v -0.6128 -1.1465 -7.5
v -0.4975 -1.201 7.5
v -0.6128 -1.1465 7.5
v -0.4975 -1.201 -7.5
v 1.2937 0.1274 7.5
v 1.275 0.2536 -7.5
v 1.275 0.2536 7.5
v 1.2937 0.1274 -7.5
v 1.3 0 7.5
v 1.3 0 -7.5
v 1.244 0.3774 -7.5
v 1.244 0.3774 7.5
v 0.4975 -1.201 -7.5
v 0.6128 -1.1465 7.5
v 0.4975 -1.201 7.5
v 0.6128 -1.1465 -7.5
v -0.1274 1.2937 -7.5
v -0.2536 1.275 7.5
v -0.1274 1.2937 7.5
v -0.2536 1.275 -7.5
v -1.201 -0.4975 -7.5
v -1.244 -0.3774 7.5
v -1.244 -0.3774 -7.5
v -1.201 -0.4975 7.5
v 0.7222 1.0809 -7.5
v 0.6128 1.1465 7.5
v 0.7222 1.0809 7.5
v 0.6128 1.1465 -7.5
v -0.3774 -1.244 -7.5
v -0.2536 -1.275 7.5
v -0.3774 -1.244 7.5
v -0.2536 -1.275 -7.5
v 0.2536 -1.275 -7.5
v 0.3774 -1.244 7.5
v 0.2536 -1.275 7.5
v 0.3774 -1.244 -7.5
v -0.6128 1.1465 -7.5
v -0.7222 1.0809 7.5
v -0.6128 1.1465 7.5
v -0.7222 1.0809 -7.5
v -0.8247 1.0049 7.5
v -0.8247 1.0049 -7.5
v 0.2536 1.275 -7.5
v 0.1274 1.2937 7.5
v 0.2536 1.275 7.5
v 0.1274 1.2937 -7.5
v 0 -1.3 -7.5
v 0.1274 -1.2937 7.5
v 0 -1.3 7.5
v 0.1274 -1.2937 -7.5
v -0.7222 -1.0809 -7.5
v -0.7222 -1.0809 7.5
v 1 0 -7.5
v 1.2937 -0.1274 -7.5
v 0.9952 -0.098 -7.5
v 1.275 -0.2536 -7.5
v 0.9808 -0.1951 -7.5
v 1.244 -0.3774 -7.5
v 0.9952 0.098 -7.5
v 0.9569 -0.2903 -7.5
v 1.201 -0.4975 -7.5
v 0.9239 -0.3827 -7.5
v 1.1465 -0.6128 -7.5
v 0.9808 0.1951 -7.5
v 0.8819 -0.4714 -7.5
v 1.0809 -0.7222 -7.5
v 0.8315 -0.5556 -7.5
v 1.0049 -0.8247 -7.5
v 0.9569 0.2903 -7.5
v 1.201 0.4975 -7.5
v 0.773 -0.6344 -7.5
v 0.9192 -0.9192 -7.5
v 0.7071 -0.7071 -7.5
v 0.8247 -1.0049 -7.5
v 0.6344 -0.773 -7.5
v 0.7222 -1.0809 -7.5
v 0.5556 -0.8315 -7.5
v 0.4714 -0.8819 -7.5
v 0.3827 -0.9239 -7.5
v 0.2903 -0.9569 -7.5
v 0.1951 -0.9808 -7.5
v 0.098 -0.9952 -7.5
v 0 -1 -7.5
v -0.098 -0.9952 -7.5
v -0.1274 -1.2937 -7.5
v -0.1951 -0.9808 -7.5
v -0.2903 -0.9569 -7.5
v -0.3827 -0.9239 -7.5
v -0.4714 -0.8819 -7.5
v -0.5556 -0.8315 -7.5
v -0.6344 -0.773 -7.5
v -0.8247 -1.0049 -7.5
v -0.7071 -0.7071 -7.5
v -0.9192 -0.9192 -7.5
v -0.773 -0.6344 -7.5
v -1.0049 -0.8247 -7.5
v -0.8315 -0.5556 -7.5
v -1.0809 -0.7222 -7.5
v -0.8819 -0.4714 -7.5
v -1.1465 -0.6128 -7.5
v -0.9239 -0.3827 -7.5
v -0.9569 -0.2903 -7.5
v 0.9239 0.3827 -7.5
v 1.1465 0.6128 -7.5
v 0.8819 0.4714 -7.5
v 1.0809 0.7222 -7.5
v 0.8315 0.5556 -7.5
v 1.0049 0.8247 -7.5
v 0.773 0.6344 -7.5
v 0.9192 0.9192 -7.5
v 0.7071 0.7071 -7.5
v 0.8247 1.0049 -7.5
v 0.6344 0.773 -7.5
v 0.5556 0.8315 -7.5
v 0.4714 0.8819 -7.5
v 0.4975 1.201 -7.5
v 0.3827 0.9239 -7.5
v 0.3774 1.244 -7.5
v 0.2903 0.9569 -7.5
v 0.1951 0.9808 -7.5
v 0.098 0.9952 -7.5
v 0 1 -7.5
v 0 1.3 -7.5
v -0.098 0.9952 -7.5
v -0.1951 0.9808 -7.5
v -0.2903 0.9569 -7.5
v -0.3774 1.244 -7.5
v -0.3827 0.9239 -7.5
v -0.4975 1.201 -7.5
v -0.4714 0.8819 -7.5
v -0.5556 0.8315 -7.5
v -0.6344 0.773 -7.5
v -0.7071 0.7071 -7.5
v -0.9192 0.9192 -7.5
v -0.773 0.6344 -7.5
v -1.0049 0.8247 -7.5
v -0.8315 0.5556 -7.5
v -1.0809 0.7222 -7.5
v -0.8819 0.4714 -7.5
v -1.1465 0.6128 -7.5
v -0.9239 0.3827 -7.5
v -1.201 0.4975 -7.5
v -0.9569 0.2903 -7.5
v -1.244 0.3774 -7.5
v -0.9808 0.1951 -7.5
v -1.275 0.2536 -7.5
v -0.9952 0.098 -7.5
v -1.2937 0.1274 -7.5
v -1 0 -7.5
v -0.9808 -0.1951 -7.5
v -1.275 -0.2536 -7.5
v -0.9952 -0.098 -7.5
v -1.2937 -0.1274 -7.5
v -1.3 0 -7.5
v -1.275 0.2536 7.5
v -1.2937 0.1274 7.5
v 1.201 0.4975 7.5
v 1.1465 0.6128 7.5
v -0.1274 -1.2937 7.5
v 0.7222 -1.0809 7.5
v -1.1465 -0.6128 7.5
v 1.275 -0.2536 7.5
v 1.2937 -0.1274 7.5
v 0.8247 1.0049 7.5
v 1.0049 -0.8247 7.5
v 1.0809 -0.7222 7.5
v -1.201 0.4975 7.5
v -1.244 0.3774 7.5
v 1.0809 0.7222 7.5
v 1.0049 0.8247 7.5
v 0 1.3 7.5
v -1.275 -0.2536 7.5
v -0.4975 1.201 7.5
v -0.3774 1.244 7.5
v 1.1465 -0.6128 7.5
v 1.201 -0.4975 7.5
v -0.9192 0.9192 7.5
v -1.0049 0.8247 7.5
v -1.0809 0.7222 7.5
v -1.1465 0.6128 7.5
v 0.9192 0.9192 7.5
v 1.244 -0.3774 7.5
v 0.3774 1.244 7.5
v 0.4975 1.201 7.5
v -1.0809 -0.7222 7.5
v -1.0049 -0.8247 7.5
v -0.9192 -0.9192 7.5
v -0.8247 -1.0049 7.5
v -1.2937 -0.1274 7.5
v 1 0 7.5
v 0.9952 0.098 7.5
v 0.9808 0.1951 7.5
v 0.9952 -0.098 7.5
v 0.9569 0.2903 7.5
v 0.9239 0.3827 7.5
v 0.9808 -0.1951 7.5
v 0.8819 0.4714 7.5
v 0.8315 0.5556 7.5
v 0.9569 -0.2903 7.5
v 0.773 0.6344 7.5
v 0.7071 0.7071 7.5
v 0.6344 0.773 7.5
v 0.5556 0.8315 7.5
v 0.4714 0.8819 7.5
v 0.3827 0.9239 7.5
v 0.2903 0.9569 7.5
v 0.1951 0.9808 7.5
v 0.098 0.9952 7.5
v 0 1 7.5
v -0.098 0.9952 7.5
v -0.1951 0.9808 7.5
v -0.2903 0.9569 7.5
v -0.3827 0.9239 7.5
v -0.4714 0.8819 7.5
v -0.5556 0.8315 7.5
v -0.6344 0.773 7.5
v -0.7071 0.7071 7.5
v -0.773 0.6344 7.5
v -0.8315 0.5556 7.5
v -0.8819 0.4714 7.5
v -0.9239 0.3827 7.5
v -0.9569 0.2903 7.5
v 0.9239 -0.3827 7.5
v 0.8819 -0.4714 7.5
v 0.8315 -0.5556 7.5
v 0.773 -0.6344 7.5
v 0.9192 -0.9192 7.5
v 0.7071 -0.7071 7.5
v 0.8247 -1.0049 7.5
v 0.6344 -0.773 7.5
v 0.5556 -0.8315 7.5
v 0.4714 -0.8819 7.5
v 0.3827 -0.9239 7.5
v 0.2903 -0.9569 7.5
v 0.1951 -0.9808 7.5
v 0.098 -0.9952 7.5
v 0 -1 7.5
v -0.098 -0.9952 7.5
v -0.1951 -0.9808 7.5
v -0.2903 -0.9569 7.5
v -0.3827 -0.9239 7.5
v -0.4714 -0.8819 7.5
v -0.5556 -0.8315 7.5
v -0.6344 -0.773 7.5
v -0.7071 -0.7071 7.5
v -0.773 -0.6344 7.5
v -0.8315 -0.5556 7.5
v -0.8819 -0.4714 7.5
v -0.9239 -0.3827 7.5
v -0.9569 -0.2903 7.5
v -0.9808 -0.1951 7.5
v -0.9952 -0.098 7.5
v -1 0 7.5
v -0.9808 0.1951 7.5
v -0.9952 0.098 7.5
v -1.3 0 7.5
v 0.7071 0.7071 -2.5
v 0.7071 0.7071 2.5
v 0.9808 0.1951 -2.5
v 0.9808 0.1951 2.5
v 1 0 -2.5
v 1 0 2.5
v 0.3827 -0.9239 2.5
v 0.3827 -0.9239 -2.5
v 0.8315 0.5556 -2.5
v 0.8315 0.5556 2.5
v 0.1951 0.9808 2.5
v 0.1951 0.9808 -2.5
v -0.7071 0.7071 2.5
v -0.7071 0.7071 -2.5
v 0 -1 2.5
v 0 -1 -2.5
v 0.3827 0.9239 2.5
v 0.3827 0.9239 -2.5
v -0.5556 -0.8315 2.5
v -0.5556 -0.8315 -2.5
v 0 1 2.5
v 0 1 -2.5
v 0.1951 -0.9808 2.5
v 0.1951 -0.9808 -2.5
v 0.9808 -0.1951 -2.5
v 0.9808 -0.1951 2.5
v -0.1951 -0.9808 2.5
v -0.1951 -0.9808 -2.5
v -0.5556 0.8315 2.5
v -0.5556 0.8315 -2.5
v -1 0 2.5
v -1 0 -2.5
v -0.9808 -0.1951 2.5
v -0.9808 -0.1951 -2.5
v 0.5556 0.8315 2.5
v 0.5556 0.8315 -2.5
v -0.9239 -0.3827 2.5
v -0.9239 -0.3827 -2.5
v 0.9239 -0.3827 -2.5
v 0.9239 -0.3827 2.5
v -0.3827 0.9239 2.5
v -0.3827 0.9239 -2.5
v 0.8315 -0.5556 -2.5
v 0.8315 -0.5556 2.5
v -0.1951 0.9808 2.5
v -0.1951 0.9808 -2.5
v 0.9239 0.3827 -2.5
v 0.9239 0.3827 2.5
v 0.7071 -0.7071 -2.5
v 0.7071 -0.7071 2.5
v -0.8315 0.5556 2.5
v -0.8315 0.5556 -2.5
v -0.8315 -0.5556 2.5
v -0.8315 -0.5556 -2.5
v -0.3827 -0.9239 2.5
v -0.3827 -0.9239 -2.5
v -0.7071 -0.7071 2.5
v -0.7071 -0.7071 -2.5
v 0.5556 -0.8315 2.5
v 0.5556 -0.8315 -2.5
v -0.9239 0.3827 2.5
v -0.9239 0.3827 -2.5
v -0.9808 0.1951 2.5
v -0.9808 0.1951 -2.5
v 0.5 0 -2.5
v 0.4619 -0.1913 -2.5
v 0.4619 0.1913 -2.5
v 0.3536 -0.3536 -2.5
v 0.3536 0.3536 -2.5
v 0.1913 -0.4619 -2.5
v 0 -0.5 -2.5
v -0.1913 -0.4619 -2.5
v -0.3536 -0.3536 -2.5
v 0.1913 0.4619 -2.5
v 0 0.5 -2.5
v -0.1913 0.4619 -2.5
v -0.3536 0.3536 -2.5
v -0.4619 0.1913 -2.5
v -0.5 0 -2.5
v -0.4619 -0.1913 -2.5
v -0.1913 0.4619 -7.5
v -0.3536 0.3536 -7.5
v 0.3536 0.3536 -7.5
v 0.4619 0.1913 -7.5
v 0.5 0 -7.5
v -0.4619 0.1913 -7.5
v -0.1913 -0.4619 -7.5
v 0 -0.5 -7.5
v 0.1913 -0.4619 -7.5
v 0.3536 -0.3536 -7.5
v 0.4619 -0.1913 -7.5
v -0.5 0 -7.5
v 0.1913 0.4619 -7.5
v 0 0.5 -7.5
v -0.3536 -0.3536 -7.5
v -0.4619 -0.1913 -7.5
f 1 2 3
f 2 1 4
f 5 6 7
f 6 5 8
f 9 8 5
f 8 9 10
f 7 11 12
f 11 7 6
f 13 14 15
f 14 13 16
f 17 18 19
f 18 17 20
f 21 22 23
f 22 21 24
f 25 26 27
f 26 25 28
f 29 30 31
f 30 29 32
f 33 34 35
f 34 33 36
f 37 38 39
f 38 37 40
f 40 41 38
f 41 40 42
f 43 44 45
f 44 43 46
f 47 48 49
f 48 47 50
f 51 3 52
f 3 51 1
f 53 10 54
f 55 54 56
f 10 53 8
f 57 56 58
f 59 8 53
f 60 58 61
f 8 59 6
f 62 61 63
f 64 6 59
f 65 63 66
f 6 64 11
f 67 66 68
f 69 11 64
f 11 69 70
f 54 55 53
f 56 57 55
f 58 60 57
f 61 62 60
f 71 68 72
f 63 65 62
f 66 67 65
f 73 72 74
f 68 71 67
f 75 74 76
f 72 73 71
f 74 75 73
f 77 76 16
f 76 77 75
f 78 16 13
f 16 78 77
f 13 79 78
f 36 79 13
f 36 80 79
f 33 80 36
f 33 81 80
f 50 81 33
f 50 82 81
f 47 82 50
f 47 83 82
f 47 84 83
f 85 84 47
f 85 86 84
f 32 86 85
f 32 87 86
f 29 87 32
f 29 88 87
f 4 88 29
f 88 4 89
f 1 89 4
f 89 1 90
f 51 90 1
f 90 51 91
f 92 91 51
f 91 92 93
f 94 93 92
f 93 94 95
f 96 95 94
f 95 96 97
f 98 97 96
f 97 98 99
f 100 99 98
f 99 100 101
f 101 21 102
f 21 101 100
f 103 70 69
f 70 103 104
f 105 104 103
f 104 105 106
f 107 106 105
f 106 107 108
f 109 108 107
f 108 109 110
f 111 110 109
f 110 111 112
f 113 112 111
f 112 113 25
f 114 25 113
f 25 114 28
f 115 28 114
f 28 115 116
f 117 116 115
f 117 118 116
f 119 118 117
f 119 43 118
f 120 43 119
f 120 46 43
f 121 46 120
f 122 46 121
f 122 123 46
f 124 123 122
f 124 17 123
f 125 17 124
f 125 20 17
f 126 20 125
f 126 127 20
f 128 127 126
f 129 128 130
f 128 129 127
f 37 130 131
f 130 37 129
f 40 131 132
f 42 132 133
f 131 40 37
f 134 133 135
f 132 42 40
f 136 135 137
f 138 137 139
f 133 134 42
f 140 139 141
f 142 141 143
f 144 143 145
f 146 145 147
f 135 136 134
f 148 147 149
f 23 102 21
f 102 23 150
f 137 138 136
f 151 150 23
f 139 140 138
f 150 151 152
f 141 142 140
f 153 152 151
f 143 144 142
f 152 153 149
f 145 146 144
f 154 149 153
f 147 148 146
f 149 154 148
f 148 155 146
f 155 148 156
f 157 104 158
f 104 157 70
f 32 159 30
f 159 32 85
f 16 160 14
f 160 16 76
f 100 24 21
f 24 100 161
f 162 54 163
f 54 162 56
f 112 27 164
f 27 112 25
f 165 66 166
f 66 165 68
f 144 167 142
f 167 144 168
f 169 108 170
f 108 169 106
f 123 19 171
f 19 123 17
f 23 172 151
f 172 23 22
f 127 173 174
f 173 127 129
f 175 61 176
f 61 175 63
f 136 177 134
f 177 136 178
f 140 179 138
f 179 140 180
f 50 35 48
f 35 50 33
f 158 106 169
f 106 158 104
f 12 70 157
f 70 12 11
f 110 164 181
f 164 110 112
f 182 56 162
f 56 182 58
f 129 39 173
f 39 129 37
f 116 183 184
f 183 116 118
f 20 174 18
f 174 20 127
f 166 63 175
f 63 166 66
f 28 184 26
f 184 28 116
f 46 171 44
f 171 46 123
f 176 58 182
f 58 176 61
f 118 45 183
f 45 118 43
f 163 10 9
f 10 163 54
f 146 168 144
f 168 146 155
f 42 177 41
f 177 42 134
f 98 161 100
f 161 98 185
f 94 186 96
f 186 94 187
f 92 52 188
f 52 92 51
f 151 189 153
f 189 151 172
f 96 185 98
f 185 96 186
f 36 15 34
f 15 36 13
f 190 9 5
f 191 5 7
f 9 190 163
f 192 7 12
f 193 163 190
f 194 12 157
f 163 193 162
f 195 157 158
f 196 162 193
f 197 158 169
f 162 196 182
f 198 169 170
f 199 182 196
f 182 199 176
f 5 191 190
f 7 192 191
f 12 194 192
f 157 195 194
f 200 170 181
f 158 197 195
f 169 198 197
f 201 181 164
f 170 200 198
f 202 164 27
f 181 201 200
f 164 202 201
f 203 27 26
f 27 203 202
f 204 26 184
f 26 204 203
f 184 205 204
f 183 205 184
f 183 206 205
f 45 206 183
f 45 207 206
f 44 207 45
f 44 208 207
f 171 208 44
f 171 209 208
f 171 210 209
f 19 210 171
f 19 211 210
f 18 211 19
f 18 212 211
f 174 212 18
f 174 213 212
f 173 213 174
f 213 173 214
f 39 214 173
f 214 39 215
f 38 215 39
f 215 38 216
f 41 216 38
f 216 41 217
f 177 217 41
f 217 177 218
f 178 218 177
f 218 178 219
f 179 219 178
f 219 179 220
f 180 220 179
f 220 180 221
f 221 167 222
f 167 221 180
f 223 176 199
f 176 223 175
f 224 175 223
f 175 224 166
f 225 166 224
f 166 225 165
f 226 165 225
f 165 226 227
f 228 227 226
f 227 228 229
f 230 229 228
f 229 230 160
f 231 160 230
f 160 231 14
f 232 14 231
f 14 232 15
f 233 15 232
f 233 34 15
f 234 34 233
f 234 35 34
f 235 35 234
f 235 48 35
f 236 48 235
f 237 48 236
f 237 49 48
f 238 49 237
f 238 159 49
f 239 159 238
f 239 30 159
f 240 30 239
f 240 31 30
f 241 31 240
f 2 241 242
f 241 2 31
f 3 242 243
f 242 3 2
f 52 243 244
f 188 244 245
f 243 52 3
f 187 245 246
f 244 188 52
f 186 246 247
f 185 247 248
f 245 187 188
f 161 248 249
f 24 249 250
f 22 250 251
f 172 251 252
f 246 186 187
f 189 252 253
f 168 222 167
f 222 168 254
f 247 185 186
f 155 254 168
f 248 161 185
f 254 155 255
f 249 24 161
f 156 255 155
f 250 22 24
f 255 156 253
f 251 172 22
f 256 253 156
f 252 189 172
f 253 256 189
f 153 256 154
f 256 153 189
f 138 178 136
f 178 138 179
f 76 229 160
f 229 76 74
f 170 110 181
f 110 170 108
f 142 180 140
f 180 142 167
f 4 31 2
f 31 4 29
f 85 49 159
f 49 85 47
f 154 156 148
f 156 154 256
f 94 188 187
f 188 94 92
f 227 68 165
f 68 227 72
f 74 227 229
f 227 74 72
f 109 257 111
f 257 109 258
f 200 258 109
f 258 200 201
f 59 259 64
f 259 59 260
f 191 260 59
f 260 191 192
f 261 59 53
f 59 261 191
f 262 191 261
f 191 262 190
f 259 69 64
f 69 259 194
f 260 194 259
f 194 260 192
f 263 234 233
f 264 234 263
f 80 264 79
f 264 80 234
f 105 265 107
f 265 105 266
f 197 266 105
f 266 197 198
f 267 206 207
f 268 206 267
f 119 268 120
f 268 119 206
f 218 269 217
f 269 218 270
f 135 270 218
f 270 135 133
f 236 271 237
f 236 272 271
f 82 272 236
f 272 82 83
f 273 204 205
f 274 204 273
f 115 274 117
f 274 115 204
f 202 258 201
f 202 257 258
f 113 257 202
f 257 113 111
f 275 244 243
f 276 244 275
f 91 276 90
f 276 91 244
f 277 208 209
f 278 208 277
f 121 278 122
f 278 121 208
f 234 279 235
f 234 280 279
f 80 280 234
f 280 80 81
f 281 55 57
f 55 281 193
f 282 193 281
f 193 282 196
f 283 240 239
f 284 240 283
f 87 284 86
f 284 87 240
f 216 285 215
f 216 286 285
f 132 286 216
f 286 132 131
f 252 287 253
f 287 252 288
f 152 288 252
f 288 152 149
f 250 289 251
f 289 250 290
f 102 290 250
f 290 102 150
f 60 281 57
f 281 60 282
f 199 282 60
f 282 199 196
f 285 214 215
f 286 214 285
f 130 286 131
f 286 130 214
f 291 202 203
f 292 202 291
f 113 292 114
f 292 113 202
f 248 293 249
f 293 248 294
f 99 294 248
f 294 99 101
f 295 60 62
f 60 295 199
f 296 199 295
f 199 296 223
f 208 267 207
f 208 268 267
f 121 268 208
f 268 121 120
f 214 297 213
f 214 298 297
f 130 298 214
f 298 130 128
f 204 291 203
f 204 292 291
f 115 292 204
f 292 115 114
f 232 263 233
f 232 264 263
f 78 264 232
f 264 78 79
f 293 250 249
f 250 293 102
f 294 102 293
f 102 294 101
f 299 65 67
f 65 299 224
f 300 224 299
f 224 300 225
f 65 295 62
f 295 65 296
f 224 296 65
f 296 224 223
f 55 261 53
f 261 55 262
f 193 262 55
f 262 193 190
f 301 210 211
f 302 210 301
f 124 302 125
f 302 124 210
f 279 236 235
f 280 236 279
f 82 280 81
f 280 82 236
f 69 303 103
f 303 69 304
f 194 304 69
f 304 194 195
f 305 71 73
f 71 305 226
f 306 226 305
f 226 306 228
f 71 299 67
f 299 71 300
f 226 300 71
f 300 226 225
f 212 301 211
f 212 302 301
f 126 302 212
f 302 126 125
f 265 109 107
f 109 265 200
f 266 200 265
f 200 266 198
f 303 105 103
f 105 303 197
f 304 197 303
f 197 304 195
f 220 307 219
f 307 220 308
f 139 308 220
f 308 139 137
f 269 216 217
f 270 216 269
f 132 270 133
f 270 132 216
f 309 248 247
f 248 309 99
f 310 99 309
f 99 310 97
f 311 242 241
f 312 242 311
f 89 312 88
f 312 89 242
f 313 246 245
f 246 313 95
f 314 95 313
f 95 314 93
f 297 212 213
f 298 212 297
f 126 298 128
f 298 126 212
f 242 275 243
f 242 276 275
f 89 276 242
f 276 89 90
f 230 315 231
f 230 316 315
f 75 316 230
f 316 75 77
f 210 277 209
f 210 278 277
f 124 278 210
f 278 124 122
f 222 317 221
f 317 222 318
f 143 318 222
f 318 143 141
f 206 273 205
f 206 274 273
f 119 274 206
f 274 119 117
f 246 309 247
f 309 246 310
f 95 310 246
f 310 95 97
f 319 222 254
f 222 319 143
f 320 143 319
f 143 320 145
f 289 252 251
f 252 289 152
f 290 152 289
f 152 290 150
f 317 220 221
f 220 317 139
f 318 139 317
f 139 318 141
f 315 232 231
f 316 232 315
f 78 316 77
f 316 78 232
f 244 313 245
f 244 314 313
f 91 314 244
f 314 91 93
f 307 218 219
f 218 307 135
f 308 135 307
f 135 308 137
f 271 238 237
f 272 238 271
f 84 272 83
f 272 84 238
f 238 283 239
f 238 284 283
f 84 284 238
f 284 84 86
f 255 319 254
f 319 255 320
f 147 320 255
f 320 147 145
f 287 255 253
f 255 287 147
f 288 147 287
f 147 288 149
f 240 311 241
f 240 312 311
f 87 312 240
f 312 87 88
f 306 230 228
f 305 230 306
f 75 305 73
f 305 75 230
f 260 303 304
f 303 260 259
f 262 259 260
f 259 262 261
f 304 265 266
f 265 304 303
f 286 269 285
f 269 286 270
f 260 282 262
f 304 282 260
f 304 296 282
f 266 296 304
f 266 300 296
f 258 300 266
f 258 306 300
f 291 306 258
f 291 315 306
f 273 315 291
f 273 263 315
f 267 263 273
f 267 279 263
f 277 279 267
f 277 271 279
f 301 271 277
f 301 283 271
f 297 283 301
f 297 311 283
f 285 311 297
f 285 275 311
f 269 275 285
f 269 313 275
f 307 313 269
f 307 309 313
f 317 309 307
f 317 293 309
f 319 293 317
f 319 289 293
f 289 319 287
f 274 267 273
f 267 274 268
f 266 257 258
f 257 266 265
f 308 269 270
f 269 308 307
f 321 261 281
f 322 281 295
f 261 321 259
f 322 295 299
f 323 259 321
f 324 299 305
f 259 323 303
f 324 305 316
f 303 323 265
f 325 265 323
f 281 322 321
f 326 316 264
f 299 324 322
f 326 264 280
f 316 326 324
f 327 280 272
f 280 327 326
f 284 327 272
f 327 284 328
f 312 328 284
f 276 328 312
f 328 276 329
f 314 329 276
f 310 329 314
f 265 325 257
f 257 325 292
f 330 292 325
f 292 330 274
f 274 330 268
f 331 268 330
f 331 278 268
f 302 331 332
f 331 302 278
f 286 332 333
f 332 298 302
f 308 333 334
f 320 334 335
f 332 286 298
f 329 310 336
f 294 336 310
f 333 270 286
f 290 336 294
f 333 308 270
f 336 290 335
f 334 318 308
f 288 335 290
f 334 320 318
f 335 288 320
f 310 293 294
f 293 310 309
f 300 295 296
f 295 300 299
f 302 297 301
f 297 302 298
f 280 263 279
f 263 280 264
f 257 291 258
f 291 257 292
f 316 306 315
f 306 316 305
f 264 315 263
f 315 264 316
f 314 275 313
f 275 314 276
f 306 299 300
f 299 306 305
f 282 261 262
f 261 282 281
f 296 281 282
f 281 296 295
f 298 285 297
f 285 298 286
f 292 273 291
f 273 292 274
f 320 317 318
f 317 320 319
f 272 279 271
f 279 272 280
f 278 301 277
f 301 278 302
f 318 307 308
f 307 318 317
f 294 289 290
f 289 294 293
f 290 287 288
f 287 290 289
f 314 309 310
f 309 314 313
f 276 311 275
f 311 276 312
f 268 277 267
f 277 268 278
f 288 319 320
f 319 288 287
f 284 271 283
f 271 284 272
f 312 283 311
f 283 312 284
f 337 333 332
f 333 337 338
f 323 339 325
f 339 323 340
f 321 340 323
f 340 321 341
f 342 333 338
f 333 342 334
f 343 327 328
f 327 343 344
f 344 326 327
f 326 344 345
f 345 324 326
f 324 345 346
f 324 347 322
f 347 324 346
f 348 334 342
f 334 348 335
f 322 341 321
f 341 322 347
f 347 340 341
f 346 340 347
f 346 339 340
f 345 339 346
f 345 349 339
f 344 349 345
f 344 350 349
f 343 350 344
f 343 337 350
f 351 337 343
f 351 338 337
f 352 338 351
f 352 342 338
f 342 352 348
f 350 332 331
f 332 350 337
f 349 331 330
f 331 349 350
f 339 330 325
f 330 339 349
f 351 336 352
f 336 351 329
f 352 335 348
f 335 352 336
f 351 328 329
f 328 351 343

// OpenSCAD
// Parameters
length = 15; //[8:30:1]
center = 1; //[0:1:1]
forced_id = 0; //[0:10:1]
default_id = 2; //[1:6:0.5]
wall_thickness = 0.3; //[0.15:0.8:0.05]
overlap = 1; //[0.5:2:0.1]

// Tubing - complete geometry
module tubing() {
  color([0.85, 0.85, 0.8]) {
    difference() {
      // Outer tube
      translate([0, 0, (center > 0 ? 0 : length / 2)])
        cylinder(h=length, r=((forced_id > 0 ? forced_id : default_id) / 2) + wall_thickness, center=true, $fn=64);
      // Inner bore
      translate([0, 0, (center > 0 ? 0 : length / 2)])
        cylinder(h=length + 2 * overlap, r=((forced_id > 0 ? forced_id : default_id) / 2), center=true, $fn=64);
    }
  }
}

// Sleeved Resistor - complete geometry
module sleeved_resistor() {
  color([0.2, 0.2, 0.2]) {
    // Resistor body
    translate([0, 0, (center > 0 ? 0 : length / 2)])
      cylinder(h=5, r=1, center=true, $fn=32);
    // Leads
    translate([0, 0, (center > 0 ? 0 : length / 2) - 2.5])
      cylinder(h=10, r=0.5, center=true, $fn=16);
  }
}

// Assembly
module assembly() {
  tubing();
  sleeved_resistor();
}

assembly();
